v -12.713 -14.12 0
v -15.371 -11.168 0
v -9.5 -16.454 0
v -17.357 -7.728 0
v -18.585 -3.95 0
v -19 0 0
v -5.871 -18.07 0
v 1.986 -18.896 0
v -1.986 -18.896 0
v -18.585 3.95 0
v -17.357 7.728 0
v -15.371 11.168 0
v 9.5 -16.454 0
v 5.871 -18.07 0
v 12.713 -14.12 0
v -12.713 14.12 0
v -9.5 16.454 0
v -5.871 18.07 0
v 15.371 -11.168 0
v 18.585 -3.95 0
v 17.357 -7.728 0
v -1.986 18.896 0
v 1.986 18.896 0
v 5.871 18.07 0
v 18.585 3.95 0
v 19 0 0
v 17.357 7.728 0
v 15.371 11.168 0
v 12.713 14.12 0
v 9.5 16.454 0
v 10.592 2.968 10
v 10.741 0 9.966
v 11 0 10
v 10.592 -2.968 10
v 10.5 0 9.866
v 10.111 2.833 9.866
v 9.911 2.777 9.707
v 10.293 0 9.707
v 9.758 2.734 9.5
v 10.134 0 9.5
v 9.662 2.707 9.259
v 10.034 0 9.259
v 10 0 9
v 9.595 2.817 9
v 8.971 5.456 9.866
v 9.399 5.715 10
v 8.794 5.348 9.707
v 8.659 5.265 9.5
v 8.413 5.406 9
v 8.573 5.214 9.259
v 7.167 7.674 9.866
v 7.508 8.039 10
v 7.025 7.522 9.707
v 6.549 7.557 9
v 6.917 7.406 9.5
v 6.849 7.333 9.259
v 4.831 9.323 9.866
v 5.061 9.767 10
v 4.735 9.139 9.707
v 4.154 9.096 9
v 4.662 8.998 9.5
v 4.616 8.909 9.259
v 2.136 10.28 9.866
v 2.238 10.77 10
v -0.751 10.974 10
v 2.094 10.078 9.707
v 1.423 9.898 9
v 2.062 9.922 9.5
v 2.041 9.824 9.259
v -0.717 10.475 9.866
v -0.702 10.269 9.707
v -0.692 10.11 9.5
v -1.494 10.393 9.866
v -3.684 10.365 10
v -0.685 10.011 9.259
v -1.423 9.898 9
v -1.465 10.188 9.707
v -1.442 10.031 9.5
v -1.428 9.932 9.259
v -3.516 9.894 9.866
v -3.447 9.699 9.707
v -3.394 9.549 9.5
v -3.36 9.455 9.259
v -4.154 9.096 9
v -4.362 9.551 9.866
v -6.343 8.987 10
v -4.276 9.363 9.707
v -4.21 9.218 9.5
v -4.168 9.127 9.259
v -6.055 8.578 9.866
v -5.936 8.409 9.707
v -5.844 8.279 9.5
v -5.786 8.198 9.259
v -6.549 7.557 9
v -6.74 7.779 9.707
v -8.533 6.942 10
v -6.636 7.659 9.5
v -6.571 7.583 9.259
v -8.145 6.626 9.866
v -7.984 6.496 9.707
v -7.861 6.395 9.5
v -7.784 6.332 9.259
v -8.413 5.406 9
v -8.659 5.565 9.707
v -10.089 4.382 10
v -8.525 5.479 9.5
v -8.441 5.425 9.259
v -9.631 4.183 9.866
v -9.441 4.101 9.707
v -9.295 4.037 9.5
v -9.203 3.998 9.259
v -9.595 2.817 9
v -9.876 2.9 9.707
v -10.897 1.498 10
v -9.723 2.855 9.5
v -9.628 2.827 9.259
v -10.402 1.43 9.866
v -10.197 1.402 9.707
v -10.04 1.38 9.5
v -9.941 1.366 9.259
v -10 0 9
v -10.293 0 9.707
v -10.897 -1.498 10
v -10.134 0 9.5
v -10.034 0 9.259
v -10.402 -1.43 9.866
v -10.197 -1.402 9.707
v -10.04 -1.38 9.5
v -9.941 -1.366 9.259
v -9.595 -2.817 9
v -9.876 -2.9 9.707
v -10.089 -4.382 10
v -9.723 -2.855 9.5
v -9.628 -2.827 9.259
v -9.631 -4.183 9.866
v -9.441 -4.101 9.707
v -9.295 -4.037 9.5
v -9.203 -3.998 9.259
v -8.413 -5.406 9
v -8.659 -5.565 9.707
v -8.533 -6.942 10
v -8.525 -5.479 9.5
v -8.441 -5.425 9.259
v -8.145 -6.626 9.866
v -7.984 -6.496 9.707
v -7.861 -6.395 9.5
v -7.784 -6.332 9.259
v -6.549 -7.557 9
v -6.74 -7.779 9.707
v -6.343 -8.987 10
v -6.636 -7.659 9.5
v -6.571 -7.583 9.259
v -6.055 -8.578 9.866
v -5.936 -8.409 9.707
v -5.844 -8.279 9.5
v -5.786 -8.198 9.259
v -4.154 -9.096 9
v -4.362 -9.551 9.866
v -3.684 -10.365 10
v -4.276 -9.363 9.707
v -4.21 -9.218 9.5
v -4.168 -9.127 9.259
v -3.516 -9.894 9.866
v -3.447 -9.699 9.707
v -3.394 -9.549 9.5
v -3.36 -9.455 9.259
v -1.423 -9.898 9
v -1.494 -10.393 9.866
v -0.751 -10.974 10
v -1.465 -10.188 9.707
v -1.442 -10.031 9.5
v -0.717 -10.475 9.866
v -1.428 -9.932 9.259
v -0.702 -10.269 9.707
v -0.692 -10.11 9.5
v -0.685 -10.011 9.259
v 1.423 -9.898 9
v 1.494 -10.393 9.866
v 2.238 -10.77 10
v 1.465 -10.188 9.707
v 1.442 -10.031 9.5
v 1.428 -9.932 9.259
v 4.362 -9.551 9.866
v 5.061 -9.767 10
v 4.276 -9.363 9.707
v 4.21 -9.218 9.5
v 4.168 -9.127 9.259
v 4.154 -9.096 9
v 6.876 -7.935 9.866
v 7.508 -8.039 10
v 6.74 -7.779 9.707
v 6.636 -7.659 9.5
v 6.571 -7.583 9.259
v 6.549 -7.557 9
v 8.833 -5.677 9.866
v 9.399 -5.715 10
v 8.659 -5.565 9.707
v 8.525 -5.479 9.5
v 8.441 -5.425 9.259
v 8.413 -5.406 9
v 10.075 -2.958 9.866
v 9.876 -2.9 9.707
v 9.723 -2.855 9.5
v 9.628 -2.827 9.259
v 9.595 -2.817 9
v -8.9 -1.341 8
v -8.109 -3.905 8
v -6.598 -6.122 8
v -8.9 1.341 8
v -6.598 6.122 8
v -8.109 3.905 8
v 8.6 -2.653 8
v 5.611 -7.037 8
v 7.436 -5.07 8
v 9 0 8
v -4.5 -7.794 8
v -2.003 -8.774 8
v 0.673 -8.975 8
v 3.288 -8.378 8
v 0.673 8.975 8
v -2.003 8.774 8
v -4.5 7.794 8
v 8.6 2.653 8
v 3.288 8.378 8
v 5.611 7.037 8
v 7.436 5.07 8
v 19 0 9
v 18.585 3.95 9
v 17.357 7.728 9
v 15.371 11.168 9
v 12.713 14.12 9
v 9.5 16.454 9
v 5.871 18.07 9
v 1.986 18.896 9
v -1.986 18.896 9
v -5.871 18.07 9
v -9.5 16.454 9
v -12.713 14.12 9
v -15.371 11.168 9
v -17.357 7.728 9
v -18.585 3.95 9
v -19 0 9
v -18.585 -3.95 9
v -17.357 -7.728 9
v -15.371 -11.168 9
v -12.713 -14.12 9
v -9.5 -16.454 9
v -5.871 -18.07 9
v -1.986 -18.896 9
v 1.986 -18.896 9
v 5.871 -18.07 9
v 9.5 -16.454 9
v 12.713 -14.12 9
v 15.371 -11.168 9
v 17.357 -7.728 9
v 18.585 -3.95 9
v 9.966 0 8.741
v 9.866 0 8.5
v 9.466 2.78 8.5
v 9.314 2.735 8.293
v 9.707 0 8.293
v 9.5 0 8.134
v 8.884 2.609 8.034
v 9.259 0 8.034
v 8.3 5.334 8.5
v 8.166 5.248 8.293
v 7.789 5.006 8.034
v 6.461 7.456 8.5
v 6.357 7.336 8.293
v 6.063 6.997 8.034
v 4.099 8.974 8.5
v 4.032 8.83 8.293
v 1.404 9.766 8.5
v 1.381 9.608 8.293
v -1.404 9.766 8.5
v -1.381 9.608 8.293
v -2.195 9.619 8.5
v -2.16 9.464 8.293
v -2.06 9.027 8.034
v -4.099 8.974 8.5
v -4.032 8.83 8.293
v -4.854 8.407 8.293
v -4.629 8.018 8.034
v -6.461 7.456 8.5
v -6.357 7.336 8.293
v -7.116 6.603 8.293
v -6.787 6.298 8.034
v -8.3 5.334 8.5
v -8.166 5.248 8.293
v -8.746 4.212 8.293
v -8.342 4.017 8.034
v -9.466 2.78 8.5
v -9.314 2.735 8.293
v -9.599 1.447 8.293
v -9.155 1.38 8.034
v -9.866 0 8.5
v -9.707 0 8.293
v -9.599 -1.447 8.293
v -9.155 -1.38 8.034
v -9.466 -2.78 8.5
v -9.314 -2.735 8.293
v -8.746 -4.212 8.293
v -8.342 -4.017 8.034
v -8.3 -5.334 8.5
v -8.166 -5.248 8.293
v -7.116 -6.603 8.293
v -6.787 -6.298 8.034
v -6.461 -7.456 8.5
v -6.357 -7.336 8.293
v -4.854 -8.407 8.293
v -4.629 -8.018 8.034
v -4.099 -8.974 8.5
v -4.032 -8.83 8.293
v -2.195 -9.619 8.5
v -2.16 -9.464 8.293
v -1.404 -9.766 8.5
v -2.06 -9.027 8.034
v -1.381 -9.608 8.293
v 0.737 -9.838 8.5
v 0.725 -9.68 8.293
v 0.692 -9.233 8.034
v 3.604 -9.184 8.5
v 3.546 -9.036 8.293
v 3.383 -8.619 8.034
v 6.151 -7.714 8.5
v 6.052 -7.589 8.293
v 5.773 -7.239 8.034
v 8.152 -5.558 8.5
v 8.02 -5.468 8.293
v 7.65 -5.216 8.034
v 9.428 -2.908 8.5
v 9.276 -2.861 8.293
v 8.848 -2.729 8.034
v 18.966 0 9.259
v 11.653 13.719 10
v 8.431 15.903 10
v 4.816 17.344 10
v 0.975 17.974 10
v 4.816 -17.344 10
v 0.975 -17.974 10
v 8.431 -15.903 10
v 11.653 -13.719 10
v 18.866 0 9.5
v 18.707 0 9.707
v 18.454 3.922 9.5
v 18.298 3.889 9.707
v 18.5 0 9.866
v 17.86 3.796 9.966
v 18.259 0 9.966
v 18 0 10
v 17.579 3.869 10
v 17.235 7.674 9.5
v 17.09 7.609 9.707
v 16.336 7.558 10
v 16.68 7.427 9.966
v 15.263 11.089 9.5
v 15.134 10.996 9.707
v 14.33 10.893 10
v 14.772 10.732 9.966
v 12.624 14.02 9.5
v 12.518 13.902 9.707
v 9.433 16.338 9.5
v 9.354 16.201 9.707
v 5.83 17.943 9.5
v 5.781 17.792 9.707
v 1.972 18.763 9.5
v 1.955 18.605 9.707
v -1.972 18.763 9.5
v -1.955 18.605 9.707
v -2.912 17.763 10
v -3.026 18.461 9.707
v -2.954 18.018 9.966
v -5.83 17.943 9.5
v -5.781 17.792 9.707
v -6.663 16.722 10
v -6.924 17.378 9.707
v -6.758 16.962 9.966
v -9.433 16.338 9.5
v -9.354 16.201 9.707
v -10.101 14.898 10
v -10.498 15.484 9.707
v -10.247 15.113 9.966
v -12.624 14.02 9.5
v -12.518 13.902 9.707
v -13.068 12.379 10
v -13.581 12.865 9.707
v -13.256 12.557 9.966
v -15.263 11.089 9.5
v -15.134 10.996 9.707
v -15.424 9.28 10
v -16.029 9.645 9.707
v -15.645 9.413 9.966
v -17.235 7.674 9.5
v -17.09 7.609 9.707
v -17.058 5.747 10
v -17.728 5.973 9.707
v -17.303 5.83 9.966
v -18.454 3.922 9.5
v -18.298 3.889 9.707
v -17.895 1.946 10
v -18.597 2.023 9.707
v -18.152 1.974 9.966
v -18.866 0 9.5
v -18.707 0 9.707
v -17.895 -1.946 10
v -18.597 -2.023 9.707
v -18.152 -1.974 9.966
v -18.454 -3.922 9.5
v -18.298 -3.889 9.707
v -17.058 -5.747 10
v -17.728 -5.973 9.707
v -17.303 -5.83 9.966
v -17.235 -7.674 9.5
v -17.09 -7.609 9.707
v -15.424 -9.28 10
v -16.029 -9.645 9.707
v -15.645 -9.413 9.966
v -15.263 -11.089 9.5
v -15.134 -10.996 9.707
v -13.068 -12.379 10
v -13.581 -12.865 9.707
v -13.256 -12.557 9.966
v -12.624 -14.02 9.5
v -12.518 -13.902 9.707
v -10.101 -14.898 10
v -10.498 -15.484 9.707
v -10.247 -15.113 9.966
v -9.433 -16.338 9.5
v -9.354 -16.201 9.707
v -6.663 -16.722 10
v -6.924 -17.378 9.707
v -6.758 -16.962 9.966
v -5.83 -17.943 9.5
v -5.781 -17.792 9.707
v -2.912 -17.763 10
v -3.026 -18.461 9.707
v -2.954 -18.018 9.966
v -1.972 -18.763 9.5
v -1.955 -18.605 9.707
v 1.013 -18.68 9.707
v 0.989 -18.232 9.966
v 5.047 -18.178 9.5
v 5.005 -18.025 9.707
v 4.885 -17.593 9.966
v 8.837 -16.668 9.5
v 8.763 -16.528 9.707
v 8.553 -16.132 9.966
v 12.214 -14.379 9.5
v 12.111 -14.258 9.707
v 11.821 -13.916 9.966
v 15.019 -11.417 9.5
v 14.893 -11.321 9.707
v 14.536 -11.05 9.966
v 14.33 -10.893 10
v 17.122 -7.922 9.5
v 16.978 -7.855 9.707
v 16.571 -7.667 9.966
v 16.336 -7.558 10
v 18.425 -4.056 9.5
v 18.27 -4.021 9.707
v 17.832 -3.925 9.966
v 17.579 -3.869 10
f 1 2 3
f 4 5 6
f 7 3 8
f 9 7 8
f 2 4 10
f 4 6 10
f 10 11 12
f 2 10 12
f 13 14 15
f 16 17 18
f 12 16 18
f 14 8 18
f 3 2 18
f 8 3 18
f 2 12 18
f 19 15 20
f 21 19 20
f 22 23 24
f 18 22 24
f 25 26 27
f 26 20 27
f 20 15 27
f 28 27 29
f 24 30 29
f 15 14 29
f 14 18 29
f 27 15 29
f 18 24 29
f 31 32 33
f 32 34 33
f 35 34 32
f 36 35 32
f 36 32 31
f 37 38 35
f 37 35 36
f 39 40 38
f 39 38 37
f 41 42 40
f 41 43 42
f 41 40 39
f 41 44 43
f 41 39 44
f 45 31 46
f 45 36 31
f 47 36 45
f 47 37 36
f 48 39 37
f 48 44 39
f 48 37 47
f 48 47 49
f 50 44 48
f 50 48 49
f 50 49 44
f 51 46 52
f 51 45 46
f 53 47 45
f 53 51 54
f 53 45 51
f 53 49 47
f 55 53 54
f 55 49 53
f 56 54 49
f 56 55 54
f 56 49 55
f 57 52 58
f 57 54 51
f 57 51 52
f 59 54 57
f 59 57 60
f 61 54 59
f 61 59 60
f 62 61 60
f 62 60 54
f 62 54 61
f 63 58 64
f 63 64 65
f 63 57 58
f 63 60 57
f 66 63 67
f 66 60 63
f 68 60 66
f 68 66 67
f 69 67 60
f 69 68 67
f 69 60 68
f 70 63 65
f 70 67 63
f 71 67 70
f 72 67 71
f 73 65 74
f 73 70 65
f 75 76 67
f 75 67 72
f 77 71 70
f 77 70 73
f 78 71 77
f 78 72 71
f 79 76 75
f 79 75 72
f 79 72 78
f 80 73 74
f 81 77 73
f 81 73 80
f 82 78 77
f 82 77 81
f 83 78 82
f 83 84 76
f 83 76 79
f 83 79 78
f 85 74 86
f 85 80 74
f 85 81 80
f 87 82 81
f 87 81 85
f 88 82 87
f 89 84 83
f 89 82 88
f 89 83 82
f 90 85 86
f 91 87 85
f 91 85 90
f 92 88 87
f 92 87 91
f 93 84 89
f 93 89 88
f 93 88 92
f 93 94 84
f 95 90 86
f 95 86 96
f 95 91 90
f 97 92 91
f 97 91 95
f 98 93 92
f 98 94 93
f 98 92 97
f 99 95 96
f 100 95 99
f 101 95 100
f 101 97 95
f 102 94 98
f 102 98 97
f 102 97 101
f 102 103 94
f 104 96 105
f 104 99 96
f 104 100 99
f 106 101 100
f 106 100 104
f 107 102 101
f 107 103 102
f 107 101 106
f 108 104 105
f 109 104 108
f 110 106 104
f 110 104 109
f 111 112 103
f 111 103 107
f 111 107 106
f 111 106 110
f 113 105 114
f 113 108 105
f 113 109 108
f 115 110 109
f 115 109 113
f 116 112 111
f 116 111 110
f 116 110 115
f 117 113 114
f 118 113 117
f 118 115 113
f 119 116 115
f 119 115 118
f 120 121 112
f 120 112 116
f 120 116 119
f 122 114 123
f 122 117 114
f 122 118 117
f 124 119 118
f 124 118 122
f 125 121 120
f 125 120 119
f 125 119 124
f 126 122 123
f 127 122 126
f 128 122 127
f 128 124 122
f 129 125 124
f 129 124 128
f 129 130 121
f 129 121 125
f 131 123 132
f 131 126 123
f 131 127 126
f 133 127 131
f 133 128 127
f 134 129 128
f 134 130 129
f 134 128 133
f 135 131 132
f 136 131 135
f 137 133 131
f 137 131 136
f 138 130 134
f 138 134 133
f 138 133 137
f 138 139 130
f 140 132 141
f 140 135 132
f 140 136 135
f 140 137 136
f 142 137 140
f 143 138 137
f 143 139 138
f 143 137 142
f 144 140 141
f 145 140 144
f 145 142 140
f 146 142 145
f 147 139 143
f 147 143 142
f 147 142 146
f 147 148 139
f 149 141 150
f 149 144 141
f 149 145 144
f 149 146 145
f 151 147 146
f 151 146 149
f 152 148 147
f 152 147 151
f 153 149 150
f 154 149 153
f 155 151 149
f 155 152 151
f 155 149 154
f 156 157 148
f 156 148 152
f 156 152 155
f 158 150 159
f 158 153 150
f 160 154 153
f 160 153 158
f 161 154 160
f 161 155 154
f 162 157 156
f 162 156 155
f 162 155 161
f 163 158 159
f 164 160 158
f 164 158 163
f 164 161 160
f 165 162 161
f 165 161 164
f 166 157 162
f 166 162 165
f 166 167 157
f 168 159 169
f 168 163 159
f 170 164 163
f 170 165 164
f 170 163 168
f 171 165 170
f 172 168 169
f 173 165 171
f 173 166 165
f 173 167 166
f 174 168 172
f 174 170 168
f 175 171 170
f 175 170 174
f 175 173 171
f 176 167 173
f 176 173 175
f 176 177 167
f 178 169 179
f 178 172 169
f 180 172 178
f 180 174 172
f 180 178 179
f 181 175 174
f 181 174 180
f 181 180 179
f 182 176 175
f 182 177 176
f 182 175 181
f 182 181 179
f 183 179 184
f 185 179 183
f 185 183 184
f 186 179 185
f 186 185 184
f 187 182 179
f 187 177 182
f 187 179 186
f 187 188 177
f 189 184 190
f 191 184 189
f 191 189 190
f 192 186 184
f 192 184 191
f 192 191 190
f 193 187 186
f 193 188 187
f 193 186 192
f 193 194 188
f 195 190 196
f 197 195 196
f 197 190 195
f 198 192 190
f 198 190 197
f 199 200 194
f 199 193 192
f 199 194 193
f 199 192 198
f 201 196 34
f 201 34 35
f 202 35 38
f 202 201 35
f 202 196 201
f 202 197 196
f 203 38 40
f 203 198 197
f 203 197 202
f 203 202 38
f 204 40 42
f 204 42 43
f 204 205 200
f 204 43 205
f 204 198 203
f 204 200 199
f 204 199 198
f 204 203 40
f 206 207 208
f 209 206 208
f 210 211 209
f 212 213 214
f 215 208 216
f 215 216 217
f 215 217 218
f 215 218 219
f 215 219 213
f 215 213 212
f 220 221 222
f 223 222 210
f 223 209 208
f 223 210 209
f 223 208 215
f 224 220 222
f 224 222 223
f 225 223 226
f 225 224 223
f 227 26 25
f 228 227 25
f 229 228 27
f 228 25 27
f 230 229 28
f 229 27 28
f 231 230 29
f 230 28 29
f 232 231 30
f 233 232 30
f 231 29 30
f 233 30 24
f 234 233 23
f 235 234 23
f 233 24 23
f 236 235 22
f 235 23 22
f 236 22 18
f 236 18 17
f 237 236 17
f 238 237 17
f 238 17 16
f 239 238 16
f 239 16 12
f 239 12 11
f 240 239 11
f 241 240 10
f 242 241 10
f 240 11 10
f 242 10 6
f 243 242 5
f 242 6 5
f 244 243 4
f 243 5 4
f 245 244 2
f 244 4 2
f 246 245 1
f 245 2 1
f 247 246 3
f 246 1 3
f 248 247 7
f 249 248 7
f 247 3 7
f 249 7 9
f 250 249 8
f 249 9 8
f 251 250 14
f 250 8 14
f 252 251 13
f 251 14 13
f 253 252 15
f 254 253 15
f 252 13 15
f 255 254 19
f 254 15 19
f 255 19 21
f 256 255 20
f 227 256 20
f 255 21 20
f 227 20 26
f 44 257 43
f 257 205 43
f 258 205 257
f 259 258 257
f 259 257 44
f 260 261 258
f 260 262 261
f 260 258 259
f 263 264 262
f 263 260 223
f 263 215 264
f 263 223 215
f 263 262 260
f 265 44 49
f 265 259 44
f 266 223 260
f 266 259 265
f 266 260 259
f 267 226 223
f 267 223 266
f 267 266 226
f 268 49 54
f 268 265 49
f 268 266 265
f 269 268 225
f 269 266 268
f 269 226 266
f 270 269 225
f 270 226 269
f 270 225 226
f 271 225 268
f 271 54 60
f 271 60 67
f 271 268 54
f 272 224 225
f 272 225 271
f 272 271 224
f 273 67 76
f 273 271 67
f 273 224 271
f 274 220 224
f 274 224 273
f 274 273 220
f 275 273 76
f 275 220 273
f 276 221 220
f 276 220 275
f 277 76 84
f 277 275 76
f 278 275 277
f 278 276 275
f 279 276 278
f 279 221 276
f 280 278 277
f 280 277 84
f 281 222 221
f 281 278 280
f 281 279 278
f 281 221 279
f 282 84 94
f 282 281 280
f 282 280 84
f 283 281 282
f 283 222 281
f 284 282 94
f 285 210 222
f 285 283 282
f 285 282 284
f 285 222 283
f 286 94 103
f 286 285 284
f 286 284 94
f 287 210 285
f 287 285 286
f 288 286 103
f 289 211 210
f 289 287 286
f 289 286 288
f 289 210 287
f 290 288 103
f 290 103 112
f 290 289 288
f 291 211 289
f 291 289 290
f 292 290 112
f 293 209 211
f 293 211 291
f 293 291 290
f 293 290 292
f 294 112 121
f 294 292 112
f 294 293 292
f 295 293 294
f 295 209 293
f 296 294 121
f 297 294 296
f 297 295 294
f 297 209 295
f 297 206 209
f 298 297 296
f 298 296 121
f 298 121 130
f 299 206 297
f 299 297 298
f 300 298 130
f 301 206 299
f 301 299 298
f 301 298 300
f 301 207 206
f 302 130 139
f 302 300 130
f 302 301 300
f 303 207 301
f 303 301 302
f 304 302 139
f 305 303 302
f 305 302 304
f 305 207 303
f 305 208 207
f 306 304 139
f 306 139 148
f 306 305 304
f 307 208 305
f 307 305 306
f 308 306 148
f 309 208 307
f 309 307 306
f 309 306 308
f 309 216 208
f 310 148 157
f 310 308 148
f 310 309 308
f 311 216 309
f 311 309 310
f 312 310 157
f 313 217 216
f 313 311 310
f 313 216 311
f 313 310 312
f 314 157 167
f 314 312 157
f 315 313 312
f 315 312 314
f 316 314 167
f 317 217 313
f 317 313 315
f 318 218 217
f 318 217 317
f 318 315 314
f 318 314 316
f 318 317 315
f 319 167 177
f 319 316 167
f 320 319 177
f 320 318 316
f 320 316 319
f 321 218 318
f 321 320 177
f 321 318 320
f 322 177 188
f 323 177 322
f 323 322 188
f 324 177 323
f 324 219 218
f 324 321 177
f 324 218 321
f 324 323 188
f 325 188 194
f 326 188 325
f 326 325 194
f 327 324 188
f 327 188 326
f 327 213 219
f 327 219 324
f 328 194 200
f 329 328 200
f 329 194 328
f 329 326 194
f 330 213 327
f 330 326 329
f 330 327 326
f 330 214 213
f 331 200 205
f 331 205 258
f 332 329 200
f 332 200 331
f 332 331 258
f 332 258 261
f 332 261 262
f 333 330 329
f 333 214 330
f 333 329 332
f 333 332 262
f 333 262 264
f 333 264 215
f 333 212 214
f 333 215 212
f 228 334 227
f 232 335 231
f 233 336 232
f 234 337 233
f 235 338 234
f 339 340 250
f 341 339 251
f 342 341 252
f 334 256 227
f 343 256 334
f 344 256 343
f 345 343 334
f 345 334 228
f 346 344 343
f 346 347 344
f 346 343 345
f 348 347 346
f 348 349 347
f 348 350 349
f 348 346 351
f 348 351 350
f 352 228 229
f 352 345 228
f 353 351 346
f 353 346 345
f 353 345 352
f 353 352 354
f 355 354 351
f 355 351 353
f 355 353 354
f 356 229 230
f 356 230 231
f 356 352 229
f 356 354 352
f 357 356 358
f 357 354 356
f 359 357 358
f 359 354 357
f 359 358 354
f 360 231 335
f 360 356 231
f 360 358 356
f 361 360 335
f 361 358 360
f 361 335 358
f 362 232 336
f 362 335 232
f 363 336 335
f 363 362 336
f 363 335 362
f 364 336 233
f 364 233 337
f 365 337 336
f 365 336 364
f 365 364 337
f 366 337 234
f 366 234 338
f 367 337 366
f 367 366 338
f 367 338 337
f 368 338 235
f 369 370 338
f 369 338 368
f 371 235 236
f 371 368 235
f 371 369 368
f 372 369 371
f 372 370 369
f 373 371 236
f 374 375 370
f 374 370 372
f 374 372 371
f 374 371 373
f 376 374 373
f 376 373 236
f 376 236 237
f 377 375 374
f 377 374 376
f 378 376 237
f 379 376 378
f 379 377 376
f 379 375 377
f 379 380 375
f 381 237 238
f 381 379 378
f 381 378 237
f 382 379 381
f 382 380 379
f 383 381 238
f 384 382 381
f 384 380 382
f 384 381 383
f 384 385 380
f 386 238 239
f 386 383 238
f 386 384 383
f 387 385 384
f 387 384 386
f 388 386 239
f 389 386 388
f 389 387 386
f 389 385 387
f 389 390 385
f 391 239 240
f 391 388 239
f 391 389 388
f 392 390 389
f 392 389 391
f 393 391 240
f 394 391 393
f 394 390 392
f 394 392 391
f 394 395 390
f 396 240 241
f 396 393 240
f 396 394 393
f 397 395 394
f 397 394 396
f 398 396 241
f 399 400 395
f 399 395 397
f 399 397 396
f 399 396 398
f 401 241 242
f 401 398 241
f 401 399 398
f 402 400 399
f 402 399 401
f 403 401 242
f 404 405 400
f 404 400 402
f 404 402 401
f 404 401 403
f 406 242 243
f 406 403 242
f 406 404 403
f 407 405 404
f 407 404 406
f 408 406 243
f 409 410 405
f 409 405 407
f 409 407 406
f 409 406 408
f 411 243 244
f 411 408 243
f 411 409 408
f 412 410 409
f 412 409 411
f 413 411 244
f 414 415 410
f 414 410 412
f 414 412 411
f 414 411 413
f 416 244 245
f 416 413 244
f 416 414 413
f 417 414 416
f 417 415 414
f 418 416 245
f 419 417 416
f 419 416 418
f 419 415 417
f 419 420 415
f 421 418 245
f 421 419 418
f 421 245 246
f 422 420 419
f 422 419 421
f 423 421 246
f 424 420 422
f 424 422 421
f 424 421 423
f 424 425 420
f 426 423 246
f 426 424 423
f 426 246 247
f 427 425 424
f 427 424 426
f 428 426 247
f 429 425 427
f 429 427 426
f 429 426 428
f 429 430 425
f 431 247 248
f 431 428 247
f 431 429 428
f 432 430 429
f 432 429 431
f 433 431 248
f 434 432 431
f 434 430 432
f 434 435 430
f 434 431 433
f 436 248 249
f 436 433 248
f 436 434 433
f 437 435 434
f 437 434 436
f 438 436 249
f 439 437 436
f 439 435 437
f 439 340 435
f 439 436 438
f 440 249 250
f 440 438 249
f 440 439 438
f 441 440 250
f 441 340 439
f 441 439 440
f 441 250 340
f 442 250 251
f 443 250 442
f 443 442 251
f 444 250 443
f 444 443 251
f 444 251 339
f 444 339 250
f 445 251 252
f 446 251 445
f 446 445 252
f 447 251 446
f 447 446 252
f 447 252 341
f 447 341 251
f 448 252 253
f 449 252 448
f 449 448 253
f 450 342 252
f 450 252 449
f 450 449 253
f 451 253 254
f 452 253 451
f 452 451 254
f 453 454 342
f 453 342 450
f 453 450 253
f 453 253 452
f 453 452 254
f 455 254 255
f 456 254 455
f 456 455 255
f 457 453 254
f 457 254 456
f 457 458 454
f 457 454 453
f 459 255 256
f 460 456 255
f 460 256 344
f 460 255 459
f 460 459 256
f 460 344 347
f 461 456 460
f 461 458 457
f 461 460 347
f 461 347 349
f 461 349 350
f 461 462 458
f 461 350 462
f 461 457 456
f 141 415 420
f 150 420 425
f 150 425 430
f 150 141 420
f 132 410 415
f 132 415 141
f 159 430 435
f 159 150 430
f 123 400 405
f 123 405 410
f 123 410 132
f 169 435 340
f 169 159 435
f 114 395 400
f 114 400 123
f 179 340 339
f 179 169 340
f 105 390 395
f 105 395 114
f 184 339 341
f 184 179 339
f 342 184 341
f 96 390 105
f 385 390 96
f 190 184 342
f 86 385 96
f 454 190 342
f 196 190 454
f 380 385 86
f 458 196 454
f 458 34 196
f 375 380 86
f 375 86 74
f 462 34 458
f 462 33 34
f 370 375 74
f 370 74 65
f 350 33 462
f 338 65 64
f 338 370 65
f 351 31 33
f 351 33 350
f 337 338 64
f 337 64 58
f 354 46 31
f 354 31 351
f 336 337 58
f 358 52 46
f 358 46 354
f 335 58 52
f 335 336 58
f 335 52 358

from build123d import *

# Parameters (mm, degrees)
SKETCH1_R           = 19
BOSS_EXTRUDE1_DEPTH = 10
SKETCH2_R           = 10
CUT_EXTRUDE1_DEPTH  = 2
FILLET1_R           = 1


with BuildPart() as part:
    # Sketch1 → Boss-Extrude1 (new body)
    with BuildSketch(Plane.XY):
        Circle(SKETCH1_R)
    extrude(amount=BOSS_EXTRUDE1_DEPTH)

    # Sketch2 → Cut-Extrude1 (cut)
    with BuildSketch(Plane.XY.offset(10)):
        Circle(SKETCH2_R)
    extrude(amount=-CUT_EXTRUDE1_DEPTH, mode=Mode.SUBTRACT)

    # Fillet1
    fillet1_edges = [part.edges().sort_by_distance(p)[0] for p in [
        (-19, 0, 10),
        (-10, 0, 8),
        (-10, 0, 10),
    ]]
    fillet(fillet1_edges, radius=FILLET1_R - 0.0001)  # a hair under: the kernel refuses the full size


solid = part.part
